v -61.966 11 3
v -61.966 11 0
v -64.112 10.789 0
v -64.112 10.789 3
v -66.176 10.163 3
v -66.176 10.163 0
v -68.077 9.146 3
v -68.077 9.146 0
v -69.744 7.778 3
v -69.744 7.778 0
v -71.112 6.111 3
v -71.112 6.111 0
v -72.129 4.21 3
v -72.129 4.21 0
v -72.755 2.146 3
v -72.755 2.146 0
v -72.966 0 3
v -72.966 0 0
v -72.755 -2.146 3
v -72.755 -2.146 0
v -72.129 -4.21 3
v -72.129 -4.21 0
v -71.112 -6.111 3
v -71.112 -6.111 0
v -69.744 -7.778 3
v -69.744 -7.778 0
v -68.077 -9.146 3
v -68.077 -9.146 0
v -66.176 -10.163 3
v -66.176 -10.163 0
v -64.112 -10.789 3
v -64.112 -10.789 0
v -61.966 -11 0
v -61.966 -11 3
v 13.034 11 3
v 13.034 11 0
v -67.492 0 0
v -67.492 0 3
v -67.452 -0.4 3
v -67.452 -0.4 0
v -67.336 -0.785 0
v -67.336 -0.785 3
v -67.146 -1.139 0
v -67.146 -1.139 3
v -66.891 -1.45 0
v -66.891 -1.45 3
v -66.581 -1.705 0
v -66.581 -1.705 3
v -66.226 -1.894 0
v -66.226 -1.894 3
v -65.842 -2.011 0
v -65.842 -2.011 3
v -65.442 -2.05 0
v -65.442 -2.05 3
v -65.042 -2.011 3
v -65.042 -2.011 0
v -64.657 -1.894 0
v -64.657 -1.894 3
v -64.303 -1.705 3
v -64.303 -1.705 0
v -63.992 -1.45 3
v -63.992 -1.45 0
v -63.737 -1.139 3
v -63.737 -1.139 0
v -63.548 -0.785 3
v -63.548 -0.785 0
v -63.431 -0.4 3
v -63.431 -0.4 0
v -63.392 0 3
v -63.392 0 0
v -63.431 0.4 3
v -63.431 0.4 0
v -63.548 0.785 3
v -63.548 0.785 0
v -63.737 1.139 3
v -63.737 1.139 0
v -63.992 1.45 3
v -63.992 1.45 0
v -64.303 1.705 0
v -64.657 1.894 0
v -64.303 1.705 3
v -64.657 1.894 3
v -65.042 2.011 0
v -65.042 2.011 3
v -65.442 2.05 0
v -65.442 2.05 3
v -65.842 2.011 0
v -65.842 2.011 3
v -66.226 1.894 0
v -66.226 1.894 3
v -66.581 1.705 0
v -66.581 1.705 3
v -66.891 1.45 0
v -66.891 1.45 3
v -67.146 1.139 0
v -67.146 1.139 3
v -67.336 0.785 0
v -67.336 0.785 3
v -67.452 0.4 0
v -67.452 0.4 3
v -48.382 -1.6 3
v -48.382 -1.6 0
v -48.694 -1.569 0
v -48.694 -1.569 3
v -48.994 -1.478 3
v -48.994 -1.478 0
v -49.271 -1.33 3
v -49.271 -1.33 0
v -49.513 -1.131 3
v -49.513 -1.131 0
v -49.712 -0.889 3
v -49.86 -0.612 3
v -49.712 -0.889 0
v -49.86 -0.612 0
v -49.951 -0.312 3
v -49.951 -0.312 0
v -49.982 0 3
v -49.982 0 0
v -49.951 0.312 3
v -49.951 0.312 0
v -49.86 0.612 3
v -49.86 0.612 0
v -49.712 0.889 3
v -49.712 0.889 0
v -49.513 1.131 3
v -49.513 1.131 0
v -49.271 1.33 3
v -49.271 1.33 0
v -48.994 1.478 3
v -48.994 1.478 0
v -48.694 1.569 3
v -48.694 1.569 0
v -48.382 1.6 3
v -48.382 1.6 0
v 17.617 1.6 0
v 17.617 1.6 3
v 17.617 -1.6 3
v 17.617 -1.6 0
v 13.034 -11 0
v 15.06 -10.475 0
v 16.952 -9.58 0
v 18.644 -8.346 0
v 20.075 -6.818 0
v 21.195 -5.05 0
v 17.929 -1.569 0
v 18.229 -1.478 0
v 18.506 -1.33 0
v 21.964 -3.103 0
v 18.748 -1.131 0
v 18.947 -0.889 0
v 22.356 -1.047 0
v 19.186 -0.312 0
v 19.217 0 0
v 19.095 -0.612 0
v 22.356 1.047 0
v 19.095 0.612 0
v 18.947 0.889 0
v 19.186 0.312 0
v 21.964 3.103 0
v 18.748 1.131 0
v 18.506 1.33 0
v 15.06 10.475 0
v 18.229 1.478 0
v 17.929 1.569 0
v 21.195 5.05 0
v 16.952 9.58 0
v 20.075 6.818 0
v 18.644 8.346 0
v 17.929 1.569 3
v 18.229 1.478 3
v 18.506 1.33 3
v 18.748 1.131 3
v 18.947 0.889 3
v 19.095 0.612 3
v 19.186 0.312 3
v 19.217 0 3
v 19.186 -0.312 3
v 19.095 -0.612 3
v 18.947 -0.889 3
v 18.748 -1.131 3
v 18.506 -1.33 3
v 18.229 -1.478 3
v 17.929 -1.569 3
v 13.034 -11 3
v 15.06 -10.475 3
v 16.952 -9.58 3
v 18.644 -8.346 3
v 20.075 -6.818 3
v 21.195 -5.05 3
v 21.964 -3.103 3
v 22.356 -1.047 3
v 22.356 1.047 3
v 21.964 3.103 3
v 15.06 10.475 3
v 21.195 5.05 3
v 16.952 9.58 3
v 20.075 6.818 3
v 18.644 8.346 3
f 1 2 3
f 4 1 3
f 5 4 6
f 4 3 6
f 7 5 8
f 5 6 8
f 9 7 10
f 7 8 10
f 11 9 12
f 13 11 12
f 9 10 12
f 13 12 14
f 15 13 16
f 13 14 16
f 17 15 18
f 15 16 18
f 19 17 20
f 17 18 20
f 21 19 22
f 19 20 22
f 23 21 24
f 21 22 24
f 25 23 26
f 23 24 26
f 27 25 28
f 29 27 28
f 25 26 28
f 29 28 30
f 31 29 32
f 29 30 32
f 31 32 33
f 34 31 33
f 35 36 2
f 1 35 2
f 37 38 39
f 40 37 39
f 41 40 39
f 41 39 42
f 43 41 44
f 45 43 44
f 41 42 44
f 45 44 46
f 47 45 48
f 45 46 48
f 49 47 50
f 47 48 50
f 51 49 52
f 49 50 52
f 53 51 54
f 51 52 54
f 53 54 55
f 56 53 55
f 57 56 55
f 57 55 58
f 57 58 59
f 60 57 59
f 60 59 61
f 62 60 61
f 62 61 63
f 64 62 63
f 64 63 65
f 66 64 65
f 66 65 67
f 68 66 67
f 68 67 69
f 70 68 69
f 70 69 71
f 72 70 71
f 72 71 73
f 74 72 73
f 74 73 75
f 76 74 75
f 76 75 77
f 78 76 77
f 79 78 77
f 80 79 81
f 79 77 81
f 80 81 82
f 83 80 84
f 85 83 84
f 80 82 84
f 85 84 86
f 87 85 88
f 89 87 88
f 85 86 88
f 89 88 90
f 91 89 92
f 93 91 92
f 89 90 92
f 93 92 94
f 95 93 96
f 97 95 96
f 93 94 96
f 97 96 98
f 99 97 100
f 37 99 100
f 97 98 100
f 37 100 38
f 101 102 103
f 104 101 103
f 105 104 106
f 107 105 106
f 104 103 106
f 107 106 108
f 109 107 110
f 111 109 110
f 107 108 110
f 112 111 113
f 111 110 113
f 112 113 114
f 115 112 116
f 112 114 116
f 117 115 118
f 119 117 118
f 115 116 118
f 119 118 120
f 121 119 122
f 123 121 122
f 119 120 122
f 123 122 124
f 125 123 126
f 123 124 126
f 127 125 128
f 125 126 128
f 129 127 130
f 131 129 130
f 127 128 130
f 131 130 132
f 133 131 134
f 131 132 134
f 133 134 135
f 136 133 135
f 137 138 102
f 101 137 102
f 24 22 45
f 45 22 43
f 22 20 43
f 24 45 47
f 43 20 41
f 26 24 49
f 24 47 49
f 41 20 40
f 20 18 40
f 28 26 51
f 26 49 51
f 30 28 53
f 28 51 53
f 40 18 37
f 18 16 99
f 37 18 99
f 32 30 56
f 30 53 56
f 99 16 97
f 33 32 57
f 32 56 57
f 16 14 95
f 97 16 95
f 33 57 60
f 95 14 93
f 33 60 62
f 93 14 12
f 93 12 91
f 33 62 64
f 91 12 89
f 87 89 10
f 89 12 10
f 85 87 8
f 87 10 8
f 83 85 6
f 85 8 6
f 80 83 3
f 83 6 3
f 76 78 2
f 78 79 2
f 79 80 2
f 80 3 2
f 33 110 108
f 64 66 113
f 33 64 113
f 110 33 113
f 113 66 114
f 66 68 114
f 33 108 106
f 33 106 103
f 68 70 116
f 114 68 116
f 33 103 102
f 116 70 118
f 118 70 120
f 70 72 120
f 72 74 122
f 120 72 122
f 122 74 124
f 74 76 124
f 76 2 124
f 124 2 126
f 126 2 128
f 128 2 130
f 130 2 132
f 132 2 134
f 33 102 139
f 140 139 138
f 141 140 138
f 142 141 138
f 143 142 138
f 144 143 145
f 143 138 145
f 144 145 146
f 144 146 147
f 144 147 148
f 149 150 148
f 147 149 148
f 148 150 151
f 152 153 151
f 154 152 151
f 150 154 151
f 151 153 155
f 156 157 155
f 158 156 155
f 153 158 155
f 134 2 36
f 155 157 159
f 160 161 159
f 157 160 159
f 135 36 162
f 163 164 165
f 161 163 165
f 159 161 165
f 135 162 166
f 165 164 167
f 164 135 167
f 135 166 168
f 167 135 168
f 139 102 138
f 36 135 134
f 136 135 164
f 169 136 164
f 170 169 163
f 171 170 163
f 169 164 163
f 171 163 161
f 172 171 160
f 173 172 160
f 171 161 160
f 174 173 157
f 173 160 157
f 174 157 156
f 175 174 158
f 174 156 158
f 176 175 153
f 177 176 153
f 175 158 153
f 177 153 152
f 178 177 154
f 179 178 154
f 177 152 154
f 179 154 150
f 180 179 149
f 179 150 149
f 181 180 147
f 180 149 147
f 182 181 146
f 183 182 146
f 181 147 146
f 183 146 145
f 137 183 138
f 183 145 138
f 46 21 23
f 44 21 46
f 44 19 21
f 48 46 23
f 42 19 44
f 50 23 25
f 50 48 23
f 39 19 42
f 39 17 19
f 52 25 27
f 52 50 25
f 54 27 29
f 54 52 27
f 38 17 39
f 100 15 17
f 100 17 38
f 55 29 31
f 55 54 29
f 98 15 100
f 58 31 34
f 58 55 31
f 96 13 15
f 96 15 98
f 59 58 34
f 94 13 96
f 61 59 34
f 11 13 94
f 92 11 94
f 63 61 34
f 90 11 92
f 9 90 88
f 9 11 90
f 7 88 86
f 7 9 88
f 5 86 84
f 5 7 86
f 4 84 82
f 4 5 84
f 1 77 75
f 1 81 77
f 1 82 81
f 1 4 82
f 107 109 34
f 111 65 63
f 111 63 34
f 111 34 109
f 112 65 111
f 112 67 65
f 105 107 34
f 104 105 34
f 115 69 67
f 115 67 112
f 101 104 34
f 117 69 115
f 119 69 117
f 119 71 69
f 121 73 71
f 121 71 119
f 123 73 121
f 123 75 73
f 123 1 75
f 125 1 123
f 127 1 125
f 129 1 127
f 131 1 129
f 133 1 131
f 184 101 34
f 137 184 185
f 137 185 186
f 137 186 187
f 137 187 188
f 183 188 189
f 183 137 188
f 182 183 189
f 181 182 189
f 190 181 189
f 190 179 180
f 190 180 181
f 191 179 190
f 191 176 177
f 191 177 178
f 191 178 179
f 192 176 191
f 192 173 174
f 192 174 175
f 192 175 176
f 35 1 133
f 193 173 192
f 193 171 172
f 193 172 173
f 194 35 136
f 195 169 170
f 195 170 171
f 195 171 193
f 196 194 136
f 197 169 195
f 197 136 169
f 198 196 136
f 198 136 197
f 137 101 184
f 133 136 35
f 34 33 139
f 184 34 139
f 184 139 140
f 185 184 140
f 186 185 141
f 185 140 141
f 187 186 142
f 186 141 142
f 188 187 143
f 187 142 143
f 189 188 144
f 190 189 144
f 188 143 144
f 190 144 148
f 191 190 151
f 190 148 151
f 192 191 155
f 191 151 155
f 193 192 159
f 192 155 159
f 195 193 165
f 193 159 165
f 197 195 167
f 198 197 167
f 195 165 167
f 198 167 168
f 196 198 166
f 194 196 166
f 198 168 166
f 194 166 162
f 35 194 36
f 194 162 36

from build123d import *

# Parameters (mm, degrees)
F1_DEPTH = 3
F2_D     = 4.1


with BuildPart() as f1:
    # F0 (on Top) → F1 (new body)
    with BuildSketch(Plane.XY):
        with BuildLine():
            Line((13.0338203524, 11), (-61.9661796476, 11))
            ThreePointArc((-61.9661796476, 11), (-72.9661796476, 0), (-61.9661796476, -11))
            Line((-61.9661796476, -11), (13.0338203524, -11))
            ThreePointArc((13.0338203524, -11), (22.4049554576, 0), (13.0338203524, 11))
        make_face()
        with BuildLine():
            ThreePointArc((-48.3821049507, -1.6), (-49.9821049507, 0), (-48.3821049507, 1.6))
            Line((-48.3821049507, 1.6), (17.6169872284, 1.6))
            ThreePointArc((17.6169872284, 1.6), (19.2169872284, 0), (17.6169872284, -1.6))
            Line((17.6169872284, -1.6), (-48.3821049507, -1.6))
        make_face(mode=Mode.SUBTRACT)
    extrude(amount=F1_DEPTH)

    # F2 (through all)
    with Locations(Plane(origin=(0, 0, 0), x_dir=(1, 0, 0), z_dir=(0, 0, -1))):
        with Locations((-65.4418841004, 0)):
            Hole(F2_D / 2)


solid = f1.part
